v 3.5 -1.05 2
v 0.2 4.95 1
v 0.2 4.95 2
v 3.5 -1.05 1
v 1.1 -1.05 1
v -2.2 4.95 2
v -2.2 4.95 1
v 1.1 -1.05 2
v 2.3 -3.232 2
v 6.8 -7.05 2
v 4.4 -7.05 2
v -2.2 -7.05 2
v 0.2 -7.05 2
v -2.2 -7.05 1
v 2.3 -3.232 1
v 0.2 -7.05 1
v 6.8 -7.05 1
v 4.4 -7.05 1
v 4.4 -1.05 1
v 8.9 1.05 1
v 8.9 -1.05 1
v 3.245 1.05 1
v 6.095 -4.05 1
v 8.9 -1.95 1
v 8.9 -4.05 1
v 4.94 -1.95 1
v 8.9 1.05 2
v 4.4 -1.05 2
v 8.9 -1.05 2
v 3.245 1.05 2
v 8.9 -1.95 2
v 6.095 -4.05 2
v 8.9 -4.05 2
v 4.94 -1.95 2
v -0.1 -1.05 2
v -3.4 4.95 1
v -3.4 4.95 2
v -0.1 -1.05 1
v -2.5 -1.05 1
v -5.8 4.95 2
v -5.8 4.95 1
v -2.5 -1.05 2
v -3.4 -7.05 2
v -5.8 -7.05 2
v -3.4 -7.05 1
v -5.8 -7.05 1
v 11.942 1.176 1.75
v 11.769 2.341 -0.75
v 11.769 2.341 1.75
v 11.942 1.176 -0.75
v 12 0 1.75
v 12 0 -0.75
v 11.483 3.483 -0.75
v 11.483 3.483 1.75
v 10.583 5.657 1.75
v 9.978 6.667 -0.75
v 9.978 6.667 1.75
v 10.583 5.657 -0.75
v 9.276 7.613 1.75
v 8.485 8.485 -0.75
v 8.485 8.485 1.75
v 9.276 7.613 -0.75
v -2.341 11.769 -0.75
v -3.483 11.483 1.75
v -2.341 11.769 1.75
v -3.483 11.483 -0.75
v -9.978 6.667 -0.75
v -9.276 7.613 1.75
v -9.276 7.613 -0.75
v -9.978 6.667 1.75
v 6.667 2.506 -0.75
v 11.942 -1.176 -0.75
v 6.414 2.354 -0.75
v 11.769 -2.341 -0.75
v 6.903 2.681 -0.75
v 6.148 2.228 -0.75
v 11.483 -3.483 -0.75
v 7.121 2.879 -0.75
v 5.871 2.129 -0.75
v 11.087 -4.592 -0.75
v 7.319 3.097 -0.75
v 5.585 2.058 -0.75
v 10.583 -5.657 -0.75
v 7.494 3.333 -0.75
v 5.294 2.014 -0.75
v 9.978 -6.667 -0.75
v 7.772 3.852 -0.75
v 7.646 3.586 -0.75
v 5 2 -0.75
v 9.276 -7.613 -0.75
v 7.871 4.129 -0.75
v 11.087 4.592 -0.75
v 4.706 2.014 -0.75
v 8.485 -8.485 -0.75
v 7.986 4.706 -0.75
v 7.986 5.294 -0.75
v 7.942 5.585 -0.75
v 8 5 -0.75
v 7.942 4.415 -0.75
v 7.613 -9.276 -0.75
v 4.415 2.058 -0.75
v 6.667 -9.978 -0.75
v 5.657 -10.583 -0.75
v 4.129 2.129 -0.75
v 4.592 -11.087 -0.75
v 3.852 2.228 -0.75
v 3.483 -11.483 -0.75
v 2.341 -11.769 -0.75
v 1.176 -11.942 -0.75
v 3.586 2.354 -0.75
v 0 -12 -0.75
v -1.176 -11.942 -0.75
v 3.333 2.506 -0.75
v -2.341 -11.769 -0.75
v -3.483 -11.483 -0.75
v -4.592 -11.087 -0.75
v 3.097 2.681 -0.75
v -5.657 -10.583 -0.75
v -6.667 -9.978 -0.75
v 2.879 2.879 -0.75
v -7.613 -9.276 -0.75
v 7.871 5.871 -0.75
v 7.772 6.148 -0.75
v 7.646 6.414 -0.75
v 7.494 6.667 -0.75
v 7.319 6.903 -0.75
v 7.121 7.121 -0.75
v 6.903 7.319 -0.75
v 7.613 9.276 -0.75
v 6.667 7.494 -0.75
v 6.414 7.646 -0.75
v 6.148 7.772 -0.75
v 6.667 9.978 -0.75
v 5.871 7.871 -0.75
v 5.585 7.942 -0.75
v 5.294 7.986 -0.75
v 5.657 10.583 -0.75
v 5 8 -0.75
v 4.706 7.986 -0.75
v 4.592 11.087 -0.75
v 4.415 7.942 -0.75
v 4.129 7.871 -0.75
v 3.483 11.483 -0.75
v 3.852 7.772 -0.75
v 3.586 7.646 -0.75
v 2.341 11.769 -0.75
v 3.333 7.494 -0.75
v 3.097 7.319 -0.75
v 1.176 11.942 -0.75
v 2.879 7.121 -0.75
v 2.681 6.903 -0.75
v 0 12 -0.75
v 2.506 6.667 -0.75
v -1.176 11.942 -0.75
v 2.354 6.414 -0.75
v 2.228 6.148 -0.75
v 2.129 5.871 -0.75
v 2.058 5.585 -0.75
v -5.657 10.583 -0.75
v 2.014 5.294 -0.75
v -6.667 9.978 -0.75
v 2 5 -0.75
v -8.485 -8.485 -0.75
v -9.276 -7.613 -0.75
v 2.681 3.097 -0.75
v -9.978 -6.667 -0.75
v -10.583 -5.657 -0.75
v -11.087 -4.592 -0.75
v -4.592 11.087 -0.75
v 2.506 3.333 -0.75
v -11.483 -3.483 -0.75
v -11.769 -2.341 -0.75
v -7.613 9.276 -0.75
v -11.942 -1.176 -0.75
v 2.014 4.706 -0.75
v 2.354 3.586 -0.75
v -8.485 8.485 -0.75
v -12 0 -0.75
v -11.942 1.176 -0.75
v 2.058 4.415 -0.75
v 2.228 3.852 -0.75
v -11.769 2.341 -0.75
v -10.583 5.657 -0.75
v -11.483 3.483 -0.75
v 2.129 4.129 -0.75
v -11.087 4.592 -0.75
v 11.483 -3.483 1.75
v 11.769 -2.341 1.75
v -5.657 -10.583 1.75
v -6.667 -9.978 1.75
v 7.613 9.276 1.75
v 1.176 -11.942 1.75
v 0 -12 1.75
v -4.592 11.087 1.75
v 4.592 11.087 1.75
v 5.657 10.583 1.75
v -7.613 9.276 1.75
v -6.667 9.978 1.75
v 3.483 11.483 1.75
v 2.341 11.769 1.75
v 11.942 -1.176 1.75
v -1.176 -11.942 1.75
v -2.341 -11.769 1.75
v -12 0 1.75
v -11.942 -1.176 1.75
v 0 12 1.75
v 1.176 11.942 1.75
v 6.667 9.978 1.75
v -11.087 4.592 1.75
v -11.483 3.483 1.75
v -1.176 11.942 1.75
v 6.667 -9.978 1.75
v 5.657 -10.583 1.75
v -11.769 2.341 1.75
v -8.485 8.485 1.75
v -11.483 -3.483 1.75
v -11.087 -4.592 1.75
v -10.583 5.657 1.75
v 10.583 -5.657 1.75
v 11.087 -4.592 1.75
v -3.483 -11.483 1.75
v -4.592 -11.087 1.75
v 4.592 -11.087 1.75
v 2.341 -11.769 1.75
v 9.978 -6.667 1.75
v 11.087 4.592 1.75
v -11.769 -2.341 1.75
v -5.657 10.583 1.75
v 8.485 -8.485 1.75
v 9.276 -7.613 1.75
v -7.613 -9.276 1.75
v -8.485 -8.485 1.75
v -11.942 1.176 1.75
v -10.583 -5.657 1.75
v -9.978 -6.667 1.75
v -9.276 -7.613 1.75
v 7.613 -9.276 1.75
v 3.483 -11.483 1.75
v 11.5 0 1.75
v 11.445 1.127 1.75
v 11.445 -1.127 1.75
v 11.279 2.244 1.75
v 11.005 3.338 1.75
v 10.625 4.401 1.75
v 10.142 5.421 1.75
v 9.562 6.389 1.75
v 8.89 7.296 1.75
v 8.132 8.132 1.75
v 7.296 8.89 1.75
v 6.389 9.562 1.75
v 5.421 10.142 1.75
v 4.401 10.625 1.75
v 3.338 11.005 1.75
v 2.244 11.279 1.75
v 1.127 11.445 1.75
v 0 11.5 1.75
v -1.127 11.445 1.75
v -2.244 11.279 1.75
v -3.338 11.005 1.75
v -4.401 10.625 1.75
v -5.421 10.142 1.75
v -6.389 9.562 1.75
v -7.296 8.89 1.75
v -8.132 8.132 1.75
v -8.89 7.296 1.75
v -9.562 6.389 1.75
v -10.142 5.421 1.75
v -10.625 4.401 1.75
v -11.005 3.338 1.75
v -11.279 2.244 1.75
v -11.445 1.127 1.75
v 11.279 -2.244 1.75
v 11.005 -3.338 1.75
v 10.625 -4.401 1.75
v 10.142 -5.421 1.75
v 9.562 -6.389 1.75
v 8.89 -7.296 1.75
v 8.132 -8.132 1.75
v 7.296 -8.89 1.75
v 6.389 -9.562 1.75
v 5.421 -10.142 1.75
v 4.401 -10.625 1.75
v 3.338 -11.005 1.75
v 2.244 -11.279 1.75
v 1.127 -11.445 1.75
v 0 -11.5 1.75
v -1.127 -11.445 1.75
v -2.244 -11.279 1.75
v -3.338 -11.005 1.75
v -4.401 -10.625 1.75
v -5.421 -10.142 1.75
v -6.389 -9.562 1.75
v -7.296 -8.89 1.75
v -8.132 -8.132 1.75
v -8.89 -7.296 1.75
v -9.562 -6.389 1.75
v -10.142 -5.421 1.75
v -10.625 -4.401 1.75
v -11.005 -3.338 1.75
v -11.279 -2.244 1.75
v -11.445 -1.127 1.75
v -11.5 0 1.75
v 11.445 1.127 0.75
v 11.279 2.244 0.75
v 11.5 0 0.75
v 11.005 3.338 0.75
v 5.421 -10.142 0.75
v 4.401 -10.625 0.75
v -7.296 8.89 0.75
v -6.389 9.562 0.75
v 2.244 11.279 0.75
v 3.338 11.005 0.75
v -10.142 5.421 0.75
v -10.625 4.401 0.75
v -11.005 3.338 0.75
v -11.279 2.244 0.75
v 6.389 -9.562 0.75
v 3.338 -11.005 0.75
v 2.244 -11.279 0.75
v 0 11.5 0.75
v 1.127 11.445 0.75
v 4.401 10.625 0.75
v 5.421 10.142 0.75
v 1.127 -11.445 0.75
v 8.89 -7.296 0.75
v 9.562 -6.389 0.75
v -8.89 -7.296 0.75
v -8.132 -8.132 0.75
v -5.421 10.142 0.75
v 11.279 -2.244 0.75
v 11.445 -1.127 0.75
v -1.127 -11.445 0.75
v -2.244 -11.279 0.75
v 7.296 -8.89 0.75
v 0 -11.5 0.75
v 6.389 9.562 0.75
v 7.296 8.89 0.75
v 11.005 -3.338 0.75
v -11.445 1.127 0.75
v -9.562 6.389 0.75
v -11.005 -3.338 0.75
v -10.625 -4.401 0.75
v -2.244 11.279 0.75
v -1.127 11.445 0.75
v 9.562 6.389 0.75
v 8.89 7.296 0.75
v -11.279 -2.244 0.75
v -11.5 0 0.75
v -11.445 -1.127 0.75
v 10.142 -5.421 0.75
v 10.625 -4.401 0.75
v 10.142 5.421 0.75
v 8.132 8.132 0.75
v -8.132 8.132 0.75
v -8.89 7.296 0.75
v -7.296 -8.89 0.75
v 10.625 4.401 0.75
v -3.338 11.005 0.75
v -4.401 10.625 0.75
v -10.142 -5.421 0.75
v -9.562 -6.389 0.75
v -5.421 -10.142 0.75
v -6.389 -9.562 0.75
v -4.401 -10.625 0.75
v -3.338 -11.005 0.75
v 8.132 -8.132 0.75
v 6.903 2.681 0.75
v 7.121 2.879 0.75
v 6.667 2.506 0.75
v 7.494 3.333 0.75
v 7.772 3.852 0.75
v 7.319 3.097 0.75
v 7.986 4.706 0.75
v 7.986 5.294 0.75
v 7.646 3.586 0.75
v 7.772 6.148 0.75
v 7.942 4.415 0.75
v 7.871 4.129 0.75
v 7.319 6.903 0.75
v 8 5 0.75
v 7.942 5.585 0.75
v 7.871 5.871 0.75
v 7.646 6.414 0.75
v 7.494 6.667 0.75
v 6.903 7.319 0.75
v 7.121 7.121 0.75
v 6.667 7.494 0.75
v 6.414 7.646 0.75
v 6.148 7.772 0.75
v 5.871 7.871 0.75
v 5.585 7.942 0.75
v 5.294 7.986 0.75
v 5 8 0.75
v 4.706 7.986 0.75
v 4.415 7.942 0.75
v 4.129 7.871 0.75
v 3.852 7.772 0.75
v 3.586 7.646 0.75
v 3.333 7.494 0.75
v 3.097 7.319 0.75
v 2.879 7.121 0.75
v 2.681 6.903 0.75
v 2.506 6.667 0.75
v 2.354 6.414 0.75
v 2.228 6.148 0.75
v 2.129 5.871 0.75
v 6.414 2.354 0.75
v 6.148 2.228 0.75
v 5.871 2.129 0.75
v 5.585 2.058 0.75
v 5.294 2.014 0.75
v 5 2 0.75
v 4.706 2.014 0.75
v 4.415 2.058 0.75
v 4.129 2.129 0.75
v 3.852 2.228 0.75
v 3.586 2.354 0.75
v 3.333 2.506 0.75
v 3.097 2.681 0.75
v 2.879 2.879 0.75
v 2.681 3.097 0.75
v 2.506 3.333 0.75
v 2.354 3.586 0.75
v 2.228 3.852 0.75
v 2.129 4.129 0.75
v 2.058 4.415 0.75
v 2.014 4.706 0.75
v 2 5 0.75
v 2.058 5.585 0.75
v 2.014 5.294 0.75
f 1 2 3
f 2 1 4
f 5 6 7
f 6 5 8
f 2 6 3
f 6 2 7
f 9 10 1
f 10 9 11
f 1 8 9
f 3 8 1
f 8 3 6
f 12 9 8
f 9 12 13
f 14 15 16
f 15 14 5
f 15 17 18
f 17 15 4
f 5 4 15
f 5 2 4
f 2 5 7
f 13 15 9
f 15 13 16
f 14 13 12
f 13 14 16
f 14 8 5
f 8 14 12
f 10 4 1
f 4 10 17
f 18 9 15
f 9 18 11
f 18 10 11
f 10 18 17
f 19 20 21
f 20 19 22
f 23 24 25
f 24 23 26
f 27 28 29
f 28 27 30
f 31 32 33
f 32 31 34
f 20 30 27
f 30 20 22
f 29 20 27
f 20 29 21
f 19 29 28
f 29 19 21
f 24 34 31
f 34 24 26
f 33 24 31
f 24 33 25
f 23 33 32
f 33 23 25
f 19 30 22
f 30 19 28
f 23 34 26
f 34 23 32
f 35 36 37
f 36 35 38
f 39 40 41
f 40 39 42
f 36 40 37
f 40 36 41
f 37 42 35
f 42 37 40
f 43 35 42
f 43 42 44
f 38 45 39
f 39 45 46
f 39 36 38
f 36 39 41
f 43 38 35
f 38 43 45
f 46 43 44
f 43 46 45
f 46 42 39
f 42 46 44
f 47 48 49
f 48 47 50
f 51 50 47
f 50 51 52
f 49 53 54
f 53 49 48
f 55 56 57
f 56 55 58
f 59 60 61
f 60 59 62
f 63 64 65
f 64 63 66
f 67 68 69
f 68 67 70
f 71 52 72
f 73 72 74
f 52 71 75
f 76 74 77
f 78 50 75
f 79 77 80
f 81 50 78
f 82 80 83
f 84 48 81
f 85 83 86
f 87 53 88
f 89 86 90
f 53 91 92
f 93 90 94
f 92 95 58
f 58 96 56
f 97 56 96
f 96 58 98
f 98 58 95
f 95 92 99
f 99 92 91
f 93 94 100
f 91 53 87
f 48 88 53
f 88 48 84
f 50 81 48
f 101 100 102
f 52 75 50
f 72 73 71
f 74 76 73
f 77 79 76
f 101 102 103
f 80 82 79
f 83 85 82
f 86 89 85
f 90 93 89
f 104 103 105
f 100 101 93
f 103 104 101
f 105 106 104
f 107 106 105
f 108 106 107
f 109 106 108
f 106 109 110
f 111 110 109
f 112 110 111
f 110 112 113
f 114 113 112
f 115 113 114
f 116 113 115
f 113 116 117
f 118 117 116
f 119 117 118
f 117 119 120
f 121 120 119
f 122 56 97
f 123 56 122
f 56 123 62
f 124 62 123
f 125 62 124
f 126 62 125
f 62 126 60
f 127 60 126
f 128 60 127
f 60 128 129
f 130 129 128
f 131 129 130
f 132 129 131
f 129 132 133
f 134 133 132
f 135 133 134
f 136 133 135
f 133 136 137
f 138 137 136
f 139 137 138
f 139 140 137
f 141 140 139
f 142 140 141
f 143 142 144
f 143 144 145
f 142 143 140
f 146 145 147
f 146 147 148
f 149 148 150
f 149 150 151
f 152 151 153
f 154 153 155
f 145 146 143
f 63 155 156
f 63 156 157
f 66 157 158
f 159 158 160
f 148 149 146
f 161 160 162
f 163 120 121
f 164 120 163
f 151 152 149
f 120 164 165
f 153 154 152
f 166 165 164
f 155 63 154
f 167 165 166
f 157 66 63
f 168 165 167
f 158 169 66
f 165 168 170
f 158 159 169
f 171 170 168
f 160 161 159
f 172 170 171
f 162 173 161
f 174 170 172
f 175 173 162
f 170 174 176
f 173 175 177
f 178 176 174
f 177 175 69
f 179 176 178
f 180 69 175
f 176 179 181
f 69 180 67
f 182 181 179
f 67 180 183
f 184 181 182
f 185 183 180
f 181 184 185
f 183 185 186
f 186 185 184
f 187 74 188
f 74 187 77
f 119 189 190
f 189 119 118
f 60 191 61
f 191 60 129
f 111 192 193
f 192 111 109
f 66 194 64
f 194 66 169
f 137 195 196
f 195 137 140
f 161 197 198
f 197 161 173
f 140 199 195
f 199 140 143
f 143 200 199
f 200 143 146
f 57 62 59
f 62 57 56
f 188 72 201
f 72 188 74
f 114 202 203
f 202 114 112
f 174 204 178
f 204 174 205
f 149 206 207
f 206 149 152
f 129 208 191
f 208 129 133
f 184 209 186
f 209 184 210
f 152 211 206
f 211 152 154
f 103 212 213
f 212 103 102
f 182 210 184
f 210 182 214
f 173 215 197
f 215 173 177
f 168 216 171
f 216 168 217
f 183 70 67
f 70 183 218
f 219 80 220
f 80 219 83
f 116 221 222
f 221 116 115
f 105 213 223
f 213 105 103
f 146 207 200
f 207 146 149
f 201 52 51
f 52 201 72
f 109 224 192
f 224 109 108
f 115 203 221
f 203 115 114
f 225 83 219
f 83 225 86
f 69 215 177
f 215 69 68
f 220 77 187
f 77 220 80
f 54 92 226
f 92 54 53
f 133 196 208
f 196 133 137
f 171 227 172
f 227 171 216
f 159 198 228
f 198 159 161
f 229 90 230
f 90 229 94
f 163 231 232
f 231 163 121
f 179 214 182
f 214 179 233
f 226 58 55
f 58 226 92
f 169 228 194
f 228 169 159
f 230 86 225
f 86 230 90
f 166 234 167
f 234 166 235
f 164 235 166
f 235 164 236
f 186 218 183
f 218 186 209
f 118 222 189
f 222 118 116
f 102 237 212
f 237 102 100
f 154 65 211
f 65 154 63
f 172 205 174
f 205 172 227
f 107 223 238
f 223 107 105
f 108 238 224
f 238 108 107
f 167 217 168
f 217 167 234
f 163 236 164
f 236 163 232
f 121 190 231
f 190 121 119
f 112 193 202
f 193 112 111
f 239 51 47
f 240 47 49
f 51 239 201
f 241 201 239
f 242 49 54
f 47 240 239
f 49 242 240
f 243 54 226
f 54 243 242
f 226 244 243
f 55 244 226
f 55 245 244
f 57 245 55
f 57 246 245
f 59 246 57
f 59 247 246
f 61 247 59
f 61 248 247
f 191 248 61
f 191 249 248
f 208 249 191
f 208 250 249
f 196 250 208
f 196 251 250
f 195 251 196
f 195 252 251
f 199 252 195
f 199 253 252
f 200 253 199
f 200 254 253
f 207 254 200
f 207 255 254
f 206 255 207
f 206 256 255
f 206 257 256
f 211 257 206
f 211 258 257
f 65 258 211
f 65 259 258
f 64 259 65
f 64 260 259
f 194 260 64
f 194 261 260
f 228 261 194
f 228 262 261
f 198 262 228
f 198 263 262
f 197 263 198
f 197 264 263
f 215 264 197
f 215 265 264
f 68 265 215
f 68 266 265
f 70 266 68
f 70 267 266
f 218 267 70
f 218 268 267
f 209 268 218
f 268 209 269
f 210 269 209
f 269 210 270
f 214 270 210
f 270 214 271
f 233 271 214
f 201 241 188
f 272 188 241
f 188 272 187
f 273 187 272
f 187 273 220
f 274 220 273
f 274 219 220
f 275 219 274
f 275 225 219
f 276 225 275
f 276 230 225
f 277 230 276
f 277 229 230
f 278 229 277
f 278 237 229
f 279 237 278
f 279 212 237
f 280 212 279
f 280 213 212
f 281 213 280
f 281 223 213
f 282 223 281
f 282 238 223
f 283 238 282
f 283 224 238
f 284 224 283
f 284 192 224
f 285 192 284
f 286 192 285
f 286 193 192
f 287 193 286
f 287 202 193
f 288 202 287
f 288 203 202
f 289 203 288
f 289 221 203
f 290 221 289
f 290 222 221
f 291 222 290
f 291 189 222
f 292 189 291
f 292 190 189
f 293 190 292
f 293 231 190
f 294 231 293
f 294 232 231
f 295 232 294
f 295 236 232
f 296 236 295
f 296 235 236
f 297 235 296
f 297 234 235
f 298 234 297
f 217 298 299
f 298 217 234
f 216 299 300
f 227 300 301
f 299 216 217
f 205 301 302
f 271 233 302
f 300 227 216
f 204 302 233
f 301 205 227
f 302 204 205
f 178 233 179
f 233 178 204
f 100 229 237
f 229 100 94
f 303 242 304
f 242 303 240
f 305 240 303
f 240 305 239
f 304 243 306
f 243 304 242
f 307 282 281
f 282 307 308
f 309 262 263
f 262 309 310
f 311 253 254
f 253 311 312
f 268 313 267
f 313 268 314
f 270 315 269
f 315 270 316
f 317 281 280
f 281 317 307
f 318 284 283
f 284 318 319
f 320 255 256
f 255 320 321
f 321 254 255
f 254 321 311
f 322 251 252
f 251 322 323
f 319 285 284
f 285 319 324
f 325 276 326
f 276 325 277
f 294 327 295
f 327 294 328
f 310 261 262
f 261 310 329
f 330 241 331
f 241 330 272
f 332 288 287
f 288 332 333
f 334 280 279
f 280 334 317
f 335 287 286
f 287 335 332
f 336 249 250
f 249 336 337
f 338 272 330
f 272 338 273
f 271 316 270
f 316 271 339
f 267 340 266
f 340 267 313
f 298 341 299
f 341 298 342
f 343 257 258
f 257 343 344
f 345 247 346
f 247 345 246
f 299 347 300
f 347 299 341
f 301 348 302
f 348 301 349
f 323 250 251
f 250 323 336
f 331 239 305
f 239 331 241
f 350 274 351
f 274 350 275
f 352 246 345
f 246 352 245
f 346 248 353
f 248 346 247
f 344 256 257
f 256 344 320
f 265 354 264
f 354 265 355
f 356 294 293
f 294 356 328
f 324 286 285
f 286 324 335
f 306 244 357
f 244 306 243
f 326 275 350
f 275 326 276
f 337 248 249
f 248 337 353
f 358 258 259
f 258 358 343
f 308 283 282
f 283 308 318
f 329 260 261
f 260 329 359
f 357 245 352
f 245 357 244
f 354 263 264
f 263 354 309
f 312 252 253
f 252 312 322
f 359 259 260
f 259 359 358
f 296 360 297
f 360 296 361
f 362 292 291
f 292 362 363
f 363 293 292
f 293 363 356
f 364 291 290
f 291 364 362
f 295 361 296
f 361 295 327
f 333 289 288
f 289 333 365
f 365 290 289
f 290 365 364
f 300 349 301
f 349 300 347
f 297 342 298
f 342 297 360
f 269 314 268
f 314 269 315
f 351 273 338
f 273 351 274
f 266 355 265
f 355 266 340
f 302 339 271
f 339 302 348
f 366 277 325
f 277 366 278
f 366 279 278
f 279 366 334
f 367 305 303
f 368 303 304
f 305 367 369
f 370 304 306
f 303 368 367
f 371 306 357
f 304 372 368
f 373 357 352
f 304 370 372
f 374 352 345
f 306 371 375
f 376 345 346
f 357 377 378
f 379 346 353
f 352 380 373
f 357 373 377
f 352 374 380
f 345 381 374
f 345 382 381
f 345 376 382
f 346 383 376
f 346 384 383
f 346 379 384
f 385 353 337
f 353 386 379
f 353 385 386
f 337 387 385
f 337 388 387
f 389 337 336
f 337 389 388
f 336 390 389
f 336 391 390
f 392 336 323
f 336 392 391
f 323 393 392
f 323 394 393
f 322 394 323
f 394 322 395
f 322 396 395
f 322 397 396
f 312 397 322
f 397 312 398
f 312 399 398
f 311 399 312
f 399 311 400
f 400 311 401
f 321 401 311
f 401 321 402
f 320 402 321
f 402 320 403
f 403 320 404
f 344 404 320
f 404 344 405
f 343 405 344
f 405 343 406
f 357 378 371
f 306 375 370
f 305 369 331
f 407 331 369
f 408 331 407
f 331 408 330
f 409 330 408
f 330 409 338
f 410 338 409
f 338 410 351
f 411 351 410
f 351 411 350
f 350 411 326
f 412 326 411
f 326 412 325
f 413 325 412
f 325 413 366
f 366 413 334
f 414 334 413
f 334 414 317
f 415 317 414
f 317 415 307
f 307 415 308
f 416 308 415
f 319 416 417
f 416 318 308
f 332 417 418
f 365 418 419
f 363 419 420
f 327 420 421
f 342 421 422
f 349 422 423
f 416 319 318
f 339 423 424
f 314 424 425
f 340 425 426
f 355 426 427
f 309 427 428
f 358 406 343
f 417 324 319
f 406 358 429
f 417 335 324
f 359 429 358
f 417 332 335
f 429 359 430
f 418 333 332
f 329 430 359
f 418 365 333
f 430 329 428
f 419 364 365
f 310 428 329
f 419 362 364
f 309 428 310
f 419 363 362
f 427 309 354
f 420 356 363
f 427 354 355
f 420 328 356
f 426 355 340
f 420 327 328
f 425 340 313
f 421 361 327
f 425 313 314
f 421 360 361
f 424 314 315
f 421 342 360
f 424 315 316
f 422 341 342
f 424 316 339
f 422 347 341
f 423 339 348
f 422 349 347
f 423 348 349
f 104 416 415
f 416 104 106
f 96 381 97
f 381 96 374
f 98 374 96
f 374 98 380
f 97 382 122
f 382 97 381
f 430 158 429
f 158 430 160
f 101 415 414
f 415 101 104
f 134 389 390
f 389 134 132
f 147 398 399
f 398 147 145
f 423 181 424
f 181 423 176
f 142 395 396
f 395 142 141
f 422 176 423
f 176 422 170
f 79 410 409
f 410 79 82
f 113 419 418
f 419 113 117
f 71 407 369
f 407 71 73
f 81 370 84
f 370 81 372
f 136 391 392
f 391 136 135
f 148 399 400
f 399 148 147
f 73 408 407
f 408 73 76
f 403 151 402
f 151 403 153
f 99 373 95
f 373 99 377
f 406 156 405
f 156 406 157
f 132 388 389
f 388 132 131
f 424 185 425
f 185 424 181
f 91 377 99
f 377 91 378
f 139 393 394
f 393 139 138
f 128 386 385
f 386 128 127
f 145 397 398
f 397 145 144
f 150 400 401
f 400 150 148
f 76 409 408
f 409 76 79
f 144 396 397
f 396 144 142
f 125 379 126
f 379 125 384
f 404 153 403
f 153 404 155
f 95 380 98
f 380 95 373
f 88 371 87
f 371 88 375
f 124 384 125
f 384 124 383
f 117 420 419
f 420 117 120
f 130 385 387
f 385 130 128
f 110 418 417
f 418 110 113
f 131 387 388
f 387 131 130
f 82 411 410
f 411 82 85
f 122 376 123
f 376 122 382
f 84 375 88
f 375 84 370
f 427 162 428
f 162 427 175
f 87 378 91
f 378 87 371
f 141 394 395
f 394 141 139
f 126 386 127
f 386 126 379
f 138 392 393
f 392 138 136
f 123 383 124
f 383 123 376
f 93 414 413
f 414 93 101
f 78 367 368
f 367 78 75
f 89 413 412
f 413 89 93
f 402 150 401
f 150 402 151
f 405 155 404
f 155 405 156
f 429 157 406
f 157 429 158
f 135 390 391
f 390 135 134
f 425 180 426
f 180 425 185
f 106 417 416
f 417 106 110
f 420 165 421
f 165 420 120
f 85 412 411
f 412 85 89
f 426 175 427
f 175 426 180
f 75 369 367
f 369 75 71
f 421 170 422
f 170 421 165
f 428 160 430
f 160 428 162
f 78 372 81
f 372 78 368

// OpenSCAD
$fn = 64;

module stick() {
/*
   ___       _
   \  \      |
    \  \     1.0
     \  \    |
      \__\   _
*/
    linear_extrude(1)
        polygon([
            [-0.75 + 0, 1  ],
            [-0.75 + 0.4, 1],
            [0.2, 0],
            [-0.2, 0],
        ]);
}

module base_haskell_logo() {
    stick();
    translate([-0.55, -1, 1])
    rotate([0, 180, 0])
        stick();

    translate([0.6, 0, 0])
        union() {
            stick();
            translate([-0.55, -1, 1])
            rotate([0, 180, 0])
                stick();
            translate([0.55, -1, 0])
                stick();
        }

    translate([0.7, 0, 0])
        intersection() {
            union() {
                translate([0, 0, 0])
                    linear_extrude(1)
                        square([1, 0.35]);

                translate([0, -0.5, 0])
                    linear_extrude(1)
                        square([1, 0.35]);
            }

            translate([0.05, 0, 0])
            union() {
                translate([0.4, 0, 0])
                    stick();
                translate([0.77, 0, 0])
                    stick();
                translate([1.15, 0, 0])
                    stick();

                translate([0.93, -0.95, 0])
                    stick();
                translate([1.33, -0.95, 0])
                    stick();
            }
        }
}

// Logo
translate([-1.3, -1.05, 1])
    scale([6, 6, 1])
        base_haskell_logo();

// Top margins
difference() {
    translate([0, 0, 0.5])
        cylinder(h=2.5, d=24, center=true);

    cylinder(h=6, d=23, center=true);
}

// Bottom cylinder with hole
difference() {
    cylinder(h=1.5, d=24, center=true);

    translate([5, 5, 0])
        cylinder(h=10, d=6, center=true);
}
